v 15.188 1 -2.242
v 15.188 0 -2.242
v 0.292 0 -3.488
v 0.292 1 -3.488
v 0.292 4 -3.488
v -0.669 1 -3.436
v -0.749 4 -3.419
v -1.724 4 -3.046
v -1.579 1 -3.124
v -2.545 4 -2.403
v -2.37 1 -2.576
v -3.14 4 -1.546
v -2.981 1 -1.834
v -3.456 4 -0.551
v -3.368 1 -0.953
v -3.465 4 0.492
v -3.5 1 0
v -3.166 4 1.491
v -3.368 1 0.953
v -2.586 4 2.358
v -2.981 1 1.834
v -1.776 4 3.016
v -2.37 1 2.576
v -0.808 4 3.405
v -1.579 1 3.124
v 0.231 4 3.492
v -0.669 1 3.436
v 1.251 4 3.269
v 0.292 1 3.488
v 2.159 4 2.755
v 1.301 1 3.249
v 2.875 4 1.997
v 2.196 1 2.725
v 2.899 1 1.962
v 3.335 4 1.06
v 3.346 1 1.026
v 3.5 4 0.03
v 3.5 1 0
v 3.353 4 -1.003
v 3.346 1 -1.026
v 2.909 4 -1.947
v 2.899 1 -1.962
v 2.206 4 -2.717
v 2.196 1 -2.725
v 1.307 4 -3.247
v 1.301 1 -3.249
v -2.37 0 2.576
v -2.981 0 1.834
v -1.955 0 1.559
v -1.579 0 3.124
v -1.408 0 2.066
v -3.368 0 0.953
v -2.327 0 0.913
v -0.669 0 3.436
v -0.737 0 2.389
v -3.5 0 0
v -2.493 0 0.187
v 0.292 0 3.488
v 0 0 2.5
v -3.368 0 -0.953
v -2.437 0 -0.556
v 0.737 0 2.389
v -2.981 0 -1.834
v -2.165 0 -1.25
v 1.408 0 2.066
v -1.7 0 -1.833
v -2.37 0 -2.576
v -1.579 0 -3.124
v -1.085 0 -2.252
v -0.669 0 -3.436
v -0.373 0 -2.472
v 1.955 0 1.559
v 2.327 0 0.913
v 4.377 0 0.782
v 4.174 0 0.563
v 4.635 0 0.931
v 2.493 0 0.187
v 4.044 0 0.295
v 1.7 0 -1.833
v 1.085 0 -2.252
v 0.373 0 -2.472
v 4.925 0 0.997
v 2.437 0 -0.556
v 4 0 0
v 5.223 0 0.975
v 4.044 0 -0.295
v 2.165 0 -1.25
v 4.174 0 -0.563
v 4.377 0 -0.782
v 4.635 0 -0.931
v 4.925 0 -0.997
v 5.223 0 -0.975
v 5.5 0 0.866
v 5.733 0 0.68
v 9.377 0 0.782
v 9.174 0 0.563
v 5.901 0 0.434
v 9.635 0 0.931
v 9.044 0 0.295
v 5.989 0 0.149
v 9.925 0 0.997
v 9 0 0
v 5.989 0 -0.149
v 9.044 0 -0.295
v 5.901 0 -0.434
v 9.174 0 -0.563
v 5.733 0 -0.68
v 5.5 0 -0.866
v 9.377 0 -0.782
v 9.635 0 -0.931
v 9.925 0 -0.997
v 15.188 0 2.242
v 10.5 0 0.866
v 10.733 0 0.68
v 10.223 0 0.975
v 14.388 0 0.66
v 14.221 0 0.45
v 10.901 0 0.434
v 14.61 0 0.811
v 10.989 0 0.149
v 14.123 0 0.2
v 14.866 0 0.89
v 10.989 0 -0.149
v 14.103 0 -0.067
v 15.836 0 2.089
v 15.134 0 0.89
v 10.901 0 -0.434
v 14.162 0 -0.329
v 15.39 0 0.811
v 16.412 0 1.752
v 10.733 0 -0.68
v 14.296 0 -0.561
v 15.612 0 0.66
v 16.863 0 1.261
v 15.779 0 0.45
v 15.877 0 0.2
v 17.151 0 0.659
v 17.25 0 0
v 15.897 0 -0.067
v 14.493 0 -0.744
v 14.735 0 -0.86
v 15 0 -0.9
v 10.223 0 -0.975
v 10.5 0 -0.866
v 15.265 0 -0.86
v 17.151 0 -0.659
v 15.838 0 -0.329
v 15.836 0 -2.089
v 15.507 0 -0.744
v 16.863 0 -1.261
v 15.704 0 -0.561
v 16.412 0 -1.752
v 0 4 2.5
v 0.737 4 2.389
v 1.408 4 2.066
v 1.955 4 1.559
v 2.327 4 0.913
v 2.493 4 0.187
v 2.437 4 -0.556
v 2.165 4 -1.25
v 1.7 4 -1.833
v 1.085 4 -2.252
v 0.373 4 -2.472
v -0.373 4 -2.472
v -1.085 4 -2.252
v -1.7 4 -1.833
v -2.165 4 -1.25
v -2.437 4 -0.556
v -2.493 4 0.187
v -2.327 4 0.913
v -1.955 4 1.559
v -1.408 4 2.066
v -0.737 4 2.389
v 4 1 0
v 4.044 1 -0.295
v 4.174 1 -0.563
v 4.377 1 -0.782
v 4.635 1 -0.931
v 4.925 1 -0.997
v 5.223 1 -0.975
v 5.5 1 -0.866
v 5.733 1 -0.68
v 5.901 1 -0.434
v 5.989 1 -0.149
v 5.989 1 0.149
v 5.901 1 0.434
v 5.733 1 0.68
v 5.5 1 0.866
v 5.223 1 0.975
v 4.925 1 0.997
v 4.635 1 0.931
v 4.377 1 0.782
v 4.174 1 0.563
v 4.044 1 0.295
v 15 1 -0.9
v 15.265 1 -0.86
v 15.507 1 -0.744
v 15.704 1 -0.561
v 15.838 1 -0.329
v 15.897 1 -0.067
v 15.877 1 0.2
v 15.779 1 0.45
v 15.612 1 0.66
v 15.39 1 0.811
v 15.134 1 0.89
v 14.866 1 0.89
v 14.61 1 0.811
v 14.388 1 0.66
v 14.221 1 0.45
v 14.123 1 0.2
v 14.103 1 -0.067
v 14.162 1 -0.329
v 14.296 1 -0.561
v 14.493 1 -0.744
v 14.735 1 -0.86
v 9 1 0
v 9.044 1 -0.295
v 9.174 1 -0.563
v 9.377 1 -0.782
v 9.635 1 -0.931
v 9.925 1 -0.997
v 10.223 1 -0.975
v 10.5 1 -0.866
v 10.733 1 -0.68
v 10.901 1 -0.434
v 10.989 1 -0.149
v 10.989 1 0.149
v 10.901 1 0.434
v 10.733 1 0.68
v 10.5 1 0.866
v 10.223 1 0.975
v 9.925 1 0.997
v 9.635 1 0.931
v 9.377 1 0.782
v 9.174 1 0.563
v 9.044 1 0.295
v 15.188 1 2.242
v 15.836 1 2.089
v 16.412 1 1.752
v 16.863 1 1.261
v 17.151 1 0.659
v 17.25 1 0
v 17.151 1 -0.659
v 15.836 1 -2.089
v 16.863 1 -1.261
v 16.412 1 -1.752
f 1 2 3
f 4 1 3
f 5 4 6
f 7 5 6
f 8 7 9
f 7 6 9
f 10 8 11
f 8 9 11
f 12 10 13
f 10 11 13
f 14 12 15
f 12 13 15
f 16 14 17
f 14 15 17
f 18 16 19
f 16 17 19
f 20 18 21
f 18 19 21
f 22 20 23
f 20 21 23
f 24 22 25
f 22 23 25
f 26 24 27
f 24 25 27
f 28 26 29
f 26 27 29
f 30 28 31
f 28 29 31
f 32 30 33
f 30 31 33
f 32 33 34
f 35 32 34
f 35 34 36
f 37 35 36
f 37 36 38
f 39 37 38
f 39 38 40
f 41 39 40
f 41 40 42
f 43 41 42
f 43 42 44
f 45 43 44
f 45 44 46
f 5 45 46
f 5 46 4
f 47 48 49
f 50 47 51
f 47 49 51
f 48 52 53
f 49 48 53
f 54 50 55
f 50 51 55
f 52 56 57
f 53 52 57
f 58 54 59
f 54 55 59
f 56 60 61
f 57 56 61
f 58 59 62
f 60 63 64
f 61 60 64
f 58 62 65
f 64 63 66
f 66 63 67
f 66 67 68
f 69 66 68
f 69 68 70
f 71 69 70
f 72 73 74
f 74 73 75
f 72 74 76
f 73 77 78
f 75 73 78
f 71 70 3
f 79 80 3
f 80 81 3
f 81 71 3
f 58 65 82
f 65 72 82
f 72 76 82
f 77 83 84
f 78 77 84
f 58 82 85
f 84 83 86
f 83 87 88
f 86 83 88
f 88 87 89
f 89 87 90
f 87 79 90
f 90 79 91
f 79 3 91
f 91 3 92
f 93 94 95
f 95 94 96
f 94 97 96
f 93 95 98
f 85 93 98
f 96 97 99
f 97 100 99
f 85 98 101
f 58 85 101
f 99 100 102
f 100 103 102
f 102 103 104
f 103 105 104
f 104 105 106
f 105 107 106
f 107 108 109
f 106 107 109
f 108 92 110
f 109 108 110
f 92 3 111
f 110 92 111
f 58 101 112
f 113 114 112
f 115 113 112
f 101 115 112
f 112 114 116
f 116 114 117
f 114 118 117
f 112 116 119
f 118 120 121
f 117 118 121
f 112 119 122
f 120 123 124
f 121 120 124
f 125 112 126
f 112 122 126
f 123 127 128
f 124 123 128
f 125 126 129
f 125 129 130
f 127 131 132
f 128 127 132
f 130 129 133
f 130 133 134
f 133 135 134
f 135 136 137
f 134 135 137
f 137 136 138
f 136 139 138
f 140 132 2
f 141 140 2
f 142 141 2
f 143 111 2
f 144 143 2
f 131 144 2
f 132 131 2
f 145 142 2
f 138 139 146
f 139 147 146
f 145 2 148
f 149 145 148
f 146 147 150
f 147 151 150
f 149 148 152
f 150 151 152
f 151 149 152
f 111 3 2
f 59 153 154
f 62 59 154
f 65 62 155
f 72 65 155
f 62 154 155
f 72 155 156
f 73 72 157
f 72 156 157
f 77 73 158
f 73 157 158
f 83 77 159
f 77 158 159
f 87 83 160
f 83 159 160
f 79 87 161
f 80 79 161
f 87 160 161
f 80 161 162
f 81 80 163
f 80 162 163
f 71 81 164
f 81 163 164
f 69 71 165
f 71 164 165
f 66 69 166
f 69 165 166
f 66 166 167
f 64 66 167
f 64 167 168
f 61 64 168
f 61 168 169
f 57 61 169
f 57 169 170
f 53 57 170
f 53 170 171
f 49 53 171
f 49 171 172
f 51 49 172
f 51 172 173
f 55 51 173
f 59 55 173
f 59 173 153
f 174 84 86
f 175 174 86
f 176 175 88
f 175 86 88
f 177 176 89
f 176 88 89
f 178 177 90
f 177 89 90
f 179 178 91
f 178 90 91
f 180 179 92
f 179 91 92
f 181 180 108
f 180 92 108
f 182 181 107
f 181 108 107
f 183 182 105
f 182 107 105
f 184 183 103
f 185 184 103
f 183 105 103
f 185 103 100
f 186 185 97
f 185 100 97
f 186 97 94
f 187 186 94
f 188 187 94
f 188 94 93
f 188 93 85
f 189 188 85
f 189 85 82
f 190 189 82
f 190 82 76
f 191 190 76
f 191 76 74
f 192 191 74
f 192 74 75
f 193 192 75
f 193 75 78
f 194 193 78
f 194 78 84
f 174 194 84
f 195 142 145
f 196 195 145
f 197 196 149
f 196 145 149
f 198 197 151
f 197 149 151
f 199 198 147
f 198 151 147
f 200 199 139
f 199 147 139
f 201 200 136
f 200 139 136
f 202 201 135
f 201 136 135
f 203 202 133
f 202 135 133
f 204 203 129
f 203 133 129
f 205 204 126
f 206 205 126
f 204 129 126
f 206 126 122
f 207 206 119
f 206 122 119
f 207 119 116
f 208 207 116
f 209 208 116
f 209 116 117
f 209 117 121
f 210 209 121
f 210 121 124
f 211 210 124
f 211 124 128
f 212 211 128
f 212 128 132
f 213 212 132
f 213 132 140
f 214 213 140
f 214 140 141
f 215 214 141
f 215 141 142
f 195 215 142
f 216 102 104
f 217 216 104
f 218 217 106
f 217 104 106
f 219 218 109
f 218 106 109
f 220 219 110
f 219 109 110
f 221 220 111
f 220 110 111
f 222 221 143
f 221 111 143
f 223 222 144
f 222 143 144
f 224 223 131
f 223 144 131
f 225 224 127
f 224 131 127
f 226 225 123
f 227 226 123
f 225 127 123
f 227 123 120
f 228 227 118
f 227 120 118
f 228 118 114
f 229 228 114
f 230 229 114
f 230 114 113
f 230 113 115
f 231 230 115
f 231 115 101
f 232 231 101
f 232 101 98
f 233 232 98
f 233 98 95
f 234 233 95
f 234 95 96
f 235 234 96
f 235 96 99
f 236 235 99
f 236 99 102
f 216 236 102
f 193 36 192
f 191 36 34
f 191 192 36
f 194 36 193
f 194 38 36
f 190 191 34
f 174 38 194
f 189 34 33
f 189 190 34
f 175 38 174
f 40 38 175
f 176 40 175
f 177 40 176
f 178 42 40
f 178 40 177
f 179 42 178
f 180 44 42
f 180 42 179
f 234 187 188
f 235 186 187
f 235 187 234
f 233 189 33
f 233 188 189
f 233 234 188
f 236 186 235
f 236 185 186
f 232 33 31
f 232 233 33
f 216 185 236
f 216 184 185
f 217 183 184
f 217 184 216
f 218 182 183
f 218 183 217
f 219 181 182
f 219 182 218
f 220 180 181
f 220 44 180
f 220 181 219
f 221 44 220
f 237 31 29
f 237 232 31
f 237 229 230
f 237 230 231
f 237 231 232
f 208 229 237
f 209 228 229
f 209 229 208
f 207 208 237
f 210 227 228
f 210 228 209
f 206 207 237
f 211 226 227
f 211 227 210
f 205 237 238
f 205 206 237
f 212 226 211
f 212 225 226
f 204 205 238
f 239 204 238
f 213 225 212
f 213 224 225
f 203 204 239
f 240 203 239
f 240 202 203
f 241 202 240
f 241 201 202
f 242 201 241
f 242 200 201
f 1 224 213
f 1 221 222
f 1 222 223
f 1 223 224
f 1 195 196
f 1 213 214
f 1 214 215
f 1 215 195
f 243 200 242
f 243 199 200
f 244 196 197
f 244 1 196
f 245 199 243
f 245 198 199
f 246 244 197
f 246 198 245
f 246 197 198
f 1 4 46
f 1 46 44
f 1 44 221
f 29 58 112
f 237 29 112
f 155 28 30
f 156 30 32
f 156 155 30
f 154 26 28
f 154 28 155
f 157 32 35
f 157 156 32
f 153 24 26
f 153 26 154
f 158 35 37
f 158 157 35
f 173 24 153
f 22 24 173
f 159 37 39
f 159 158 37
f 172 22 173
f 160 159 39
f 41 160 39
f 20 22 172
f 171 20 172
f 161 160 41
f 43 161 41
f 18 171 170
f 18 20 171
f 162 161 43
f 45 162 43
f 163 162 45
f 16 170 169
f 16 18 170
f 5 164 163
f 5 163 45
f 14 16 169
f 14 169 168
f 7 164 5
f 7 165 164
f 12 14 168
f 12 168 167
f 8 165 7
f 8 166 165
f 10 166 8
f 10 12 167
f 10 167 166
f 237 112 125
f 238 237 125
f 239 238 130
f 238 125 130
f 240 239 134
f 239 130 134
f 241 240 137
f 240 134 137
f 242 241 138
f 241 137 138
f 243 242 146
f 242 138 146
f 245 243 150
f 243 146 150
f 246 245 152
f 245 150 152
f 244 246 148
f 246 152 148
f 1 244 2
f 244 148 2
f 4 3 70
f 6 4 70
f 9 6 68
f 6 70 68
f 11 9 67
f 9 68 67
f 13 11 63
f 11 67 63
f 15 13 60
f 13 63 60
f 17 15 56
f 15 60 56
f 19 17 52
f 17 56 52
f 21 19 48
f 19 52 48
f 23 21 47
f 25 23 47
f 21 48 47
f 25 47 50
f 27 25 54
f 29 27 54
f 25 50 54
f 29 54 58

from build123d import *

# Parameters (mm, degrees)
BOSS_EXTRUDE1_DEPTH = 1
SKETCH2_R           = 3.5
BOSS_EXTRUDE2_DEPTH = 3
SKETCH3_R           = 2.5
CUT_EXTRUDE1_DEPTH  = 19.050277006
SKETCH4_R           = 0.9
CUT_EXTRUDE2_DEPTH  = 19.050277006
CUT_EXTRUDE3_DEPTH  = 19.050277006


with BuildPart() as part:
    # Sketch1 → Boss-Extrude1 (new body)
    with BuildSketch(Plane(origin=(0, 0, 0), x_dir=(1, 0, 0), z_dir=(0, 1, 0))):
        with BuildLine():
            Line((15.1875, 2.242173889), (0.291666667, 3.48782605))
            ThreePointArc((0.291666667, 3.48782605), (-3.5, 0), (0.291666667, -3.48782605))
            Line((0.291666667, -3.48782605), (15.1875, -2.242173889))
            ThreePointArc((15.1875, -2.242173889), (17.25, 0), (15.1875, 2.242173889))
        make_face()
    extrude(amount=BOSS_EXTRUDE1_DEPTH)

    # Sketch2 → Boss-Extrude2 (add)
    with BuildSketch(Plane(origin=(0, 1, 0), x_dir=(1, 0, 0), z_dir=(0, 1, 0))):
        with Locations(Location((0, 0, 0), (0, 0, 85.219808153))):
            Circle(SKETCH2_R)
    extrude(amount=BOSS_EXTRUDE2_DEPTH)

    # Sketch3 → Cut-Extrude1 (cut, through all)
    with BuildSketch(Plane(origin=(0, 4, 0), x_dir=(1, 0, 0), z_dir=(0, 1, 0))):
        with Locations(Location((0, 0, 0), (0, 0, 270))):
            Circle(SKETCH3_R)
    extrude(amount=-CUT_EXTRUDE1_DEPTH, mode=Mode.SUBTRACT)

    # Sketch4 → Cut-Extrude2 (cut, through all)
    with BuildSketch(Plane.XZ):
        with Locations(Location((15, 0, 0), (0, 0, 270))):
            Circle(SKETCH4_R)
    extrude(amount=-CUT_EXTRUDE2_DEPTH, mode=Mode.SUBTRACT)

    # Sketch5 → Cut-Extrude3 (cut, through all)
    with BuildSketch(Plane.XZ):
        with BuildLine():
            ThreePointArc((6, 0), (5, 1), (4, 0))
            Line((4, 0), (6, 0))
        make_face()
        with BuildLine():
            Line((6, 0), (4, 0))
            ThreePointArc((4, 0), (5, -1), (6, 0))
        make_face()
        with BuildLine():
            ThreePointArc((11, 0), (10, 1), (9, 0))
            Line((9, 0), (11, 0))
        make_face()
        with BuildLine():
            Line((11, 0), (9, 0))
            ThreePointArc((9, 0), (10, -1), (11, 0))
        make_face()
    extrude(amount=-CUT_EXTRUDE3_DEPTH, mode=Mode.SUBTRACT)


solid = part.part
